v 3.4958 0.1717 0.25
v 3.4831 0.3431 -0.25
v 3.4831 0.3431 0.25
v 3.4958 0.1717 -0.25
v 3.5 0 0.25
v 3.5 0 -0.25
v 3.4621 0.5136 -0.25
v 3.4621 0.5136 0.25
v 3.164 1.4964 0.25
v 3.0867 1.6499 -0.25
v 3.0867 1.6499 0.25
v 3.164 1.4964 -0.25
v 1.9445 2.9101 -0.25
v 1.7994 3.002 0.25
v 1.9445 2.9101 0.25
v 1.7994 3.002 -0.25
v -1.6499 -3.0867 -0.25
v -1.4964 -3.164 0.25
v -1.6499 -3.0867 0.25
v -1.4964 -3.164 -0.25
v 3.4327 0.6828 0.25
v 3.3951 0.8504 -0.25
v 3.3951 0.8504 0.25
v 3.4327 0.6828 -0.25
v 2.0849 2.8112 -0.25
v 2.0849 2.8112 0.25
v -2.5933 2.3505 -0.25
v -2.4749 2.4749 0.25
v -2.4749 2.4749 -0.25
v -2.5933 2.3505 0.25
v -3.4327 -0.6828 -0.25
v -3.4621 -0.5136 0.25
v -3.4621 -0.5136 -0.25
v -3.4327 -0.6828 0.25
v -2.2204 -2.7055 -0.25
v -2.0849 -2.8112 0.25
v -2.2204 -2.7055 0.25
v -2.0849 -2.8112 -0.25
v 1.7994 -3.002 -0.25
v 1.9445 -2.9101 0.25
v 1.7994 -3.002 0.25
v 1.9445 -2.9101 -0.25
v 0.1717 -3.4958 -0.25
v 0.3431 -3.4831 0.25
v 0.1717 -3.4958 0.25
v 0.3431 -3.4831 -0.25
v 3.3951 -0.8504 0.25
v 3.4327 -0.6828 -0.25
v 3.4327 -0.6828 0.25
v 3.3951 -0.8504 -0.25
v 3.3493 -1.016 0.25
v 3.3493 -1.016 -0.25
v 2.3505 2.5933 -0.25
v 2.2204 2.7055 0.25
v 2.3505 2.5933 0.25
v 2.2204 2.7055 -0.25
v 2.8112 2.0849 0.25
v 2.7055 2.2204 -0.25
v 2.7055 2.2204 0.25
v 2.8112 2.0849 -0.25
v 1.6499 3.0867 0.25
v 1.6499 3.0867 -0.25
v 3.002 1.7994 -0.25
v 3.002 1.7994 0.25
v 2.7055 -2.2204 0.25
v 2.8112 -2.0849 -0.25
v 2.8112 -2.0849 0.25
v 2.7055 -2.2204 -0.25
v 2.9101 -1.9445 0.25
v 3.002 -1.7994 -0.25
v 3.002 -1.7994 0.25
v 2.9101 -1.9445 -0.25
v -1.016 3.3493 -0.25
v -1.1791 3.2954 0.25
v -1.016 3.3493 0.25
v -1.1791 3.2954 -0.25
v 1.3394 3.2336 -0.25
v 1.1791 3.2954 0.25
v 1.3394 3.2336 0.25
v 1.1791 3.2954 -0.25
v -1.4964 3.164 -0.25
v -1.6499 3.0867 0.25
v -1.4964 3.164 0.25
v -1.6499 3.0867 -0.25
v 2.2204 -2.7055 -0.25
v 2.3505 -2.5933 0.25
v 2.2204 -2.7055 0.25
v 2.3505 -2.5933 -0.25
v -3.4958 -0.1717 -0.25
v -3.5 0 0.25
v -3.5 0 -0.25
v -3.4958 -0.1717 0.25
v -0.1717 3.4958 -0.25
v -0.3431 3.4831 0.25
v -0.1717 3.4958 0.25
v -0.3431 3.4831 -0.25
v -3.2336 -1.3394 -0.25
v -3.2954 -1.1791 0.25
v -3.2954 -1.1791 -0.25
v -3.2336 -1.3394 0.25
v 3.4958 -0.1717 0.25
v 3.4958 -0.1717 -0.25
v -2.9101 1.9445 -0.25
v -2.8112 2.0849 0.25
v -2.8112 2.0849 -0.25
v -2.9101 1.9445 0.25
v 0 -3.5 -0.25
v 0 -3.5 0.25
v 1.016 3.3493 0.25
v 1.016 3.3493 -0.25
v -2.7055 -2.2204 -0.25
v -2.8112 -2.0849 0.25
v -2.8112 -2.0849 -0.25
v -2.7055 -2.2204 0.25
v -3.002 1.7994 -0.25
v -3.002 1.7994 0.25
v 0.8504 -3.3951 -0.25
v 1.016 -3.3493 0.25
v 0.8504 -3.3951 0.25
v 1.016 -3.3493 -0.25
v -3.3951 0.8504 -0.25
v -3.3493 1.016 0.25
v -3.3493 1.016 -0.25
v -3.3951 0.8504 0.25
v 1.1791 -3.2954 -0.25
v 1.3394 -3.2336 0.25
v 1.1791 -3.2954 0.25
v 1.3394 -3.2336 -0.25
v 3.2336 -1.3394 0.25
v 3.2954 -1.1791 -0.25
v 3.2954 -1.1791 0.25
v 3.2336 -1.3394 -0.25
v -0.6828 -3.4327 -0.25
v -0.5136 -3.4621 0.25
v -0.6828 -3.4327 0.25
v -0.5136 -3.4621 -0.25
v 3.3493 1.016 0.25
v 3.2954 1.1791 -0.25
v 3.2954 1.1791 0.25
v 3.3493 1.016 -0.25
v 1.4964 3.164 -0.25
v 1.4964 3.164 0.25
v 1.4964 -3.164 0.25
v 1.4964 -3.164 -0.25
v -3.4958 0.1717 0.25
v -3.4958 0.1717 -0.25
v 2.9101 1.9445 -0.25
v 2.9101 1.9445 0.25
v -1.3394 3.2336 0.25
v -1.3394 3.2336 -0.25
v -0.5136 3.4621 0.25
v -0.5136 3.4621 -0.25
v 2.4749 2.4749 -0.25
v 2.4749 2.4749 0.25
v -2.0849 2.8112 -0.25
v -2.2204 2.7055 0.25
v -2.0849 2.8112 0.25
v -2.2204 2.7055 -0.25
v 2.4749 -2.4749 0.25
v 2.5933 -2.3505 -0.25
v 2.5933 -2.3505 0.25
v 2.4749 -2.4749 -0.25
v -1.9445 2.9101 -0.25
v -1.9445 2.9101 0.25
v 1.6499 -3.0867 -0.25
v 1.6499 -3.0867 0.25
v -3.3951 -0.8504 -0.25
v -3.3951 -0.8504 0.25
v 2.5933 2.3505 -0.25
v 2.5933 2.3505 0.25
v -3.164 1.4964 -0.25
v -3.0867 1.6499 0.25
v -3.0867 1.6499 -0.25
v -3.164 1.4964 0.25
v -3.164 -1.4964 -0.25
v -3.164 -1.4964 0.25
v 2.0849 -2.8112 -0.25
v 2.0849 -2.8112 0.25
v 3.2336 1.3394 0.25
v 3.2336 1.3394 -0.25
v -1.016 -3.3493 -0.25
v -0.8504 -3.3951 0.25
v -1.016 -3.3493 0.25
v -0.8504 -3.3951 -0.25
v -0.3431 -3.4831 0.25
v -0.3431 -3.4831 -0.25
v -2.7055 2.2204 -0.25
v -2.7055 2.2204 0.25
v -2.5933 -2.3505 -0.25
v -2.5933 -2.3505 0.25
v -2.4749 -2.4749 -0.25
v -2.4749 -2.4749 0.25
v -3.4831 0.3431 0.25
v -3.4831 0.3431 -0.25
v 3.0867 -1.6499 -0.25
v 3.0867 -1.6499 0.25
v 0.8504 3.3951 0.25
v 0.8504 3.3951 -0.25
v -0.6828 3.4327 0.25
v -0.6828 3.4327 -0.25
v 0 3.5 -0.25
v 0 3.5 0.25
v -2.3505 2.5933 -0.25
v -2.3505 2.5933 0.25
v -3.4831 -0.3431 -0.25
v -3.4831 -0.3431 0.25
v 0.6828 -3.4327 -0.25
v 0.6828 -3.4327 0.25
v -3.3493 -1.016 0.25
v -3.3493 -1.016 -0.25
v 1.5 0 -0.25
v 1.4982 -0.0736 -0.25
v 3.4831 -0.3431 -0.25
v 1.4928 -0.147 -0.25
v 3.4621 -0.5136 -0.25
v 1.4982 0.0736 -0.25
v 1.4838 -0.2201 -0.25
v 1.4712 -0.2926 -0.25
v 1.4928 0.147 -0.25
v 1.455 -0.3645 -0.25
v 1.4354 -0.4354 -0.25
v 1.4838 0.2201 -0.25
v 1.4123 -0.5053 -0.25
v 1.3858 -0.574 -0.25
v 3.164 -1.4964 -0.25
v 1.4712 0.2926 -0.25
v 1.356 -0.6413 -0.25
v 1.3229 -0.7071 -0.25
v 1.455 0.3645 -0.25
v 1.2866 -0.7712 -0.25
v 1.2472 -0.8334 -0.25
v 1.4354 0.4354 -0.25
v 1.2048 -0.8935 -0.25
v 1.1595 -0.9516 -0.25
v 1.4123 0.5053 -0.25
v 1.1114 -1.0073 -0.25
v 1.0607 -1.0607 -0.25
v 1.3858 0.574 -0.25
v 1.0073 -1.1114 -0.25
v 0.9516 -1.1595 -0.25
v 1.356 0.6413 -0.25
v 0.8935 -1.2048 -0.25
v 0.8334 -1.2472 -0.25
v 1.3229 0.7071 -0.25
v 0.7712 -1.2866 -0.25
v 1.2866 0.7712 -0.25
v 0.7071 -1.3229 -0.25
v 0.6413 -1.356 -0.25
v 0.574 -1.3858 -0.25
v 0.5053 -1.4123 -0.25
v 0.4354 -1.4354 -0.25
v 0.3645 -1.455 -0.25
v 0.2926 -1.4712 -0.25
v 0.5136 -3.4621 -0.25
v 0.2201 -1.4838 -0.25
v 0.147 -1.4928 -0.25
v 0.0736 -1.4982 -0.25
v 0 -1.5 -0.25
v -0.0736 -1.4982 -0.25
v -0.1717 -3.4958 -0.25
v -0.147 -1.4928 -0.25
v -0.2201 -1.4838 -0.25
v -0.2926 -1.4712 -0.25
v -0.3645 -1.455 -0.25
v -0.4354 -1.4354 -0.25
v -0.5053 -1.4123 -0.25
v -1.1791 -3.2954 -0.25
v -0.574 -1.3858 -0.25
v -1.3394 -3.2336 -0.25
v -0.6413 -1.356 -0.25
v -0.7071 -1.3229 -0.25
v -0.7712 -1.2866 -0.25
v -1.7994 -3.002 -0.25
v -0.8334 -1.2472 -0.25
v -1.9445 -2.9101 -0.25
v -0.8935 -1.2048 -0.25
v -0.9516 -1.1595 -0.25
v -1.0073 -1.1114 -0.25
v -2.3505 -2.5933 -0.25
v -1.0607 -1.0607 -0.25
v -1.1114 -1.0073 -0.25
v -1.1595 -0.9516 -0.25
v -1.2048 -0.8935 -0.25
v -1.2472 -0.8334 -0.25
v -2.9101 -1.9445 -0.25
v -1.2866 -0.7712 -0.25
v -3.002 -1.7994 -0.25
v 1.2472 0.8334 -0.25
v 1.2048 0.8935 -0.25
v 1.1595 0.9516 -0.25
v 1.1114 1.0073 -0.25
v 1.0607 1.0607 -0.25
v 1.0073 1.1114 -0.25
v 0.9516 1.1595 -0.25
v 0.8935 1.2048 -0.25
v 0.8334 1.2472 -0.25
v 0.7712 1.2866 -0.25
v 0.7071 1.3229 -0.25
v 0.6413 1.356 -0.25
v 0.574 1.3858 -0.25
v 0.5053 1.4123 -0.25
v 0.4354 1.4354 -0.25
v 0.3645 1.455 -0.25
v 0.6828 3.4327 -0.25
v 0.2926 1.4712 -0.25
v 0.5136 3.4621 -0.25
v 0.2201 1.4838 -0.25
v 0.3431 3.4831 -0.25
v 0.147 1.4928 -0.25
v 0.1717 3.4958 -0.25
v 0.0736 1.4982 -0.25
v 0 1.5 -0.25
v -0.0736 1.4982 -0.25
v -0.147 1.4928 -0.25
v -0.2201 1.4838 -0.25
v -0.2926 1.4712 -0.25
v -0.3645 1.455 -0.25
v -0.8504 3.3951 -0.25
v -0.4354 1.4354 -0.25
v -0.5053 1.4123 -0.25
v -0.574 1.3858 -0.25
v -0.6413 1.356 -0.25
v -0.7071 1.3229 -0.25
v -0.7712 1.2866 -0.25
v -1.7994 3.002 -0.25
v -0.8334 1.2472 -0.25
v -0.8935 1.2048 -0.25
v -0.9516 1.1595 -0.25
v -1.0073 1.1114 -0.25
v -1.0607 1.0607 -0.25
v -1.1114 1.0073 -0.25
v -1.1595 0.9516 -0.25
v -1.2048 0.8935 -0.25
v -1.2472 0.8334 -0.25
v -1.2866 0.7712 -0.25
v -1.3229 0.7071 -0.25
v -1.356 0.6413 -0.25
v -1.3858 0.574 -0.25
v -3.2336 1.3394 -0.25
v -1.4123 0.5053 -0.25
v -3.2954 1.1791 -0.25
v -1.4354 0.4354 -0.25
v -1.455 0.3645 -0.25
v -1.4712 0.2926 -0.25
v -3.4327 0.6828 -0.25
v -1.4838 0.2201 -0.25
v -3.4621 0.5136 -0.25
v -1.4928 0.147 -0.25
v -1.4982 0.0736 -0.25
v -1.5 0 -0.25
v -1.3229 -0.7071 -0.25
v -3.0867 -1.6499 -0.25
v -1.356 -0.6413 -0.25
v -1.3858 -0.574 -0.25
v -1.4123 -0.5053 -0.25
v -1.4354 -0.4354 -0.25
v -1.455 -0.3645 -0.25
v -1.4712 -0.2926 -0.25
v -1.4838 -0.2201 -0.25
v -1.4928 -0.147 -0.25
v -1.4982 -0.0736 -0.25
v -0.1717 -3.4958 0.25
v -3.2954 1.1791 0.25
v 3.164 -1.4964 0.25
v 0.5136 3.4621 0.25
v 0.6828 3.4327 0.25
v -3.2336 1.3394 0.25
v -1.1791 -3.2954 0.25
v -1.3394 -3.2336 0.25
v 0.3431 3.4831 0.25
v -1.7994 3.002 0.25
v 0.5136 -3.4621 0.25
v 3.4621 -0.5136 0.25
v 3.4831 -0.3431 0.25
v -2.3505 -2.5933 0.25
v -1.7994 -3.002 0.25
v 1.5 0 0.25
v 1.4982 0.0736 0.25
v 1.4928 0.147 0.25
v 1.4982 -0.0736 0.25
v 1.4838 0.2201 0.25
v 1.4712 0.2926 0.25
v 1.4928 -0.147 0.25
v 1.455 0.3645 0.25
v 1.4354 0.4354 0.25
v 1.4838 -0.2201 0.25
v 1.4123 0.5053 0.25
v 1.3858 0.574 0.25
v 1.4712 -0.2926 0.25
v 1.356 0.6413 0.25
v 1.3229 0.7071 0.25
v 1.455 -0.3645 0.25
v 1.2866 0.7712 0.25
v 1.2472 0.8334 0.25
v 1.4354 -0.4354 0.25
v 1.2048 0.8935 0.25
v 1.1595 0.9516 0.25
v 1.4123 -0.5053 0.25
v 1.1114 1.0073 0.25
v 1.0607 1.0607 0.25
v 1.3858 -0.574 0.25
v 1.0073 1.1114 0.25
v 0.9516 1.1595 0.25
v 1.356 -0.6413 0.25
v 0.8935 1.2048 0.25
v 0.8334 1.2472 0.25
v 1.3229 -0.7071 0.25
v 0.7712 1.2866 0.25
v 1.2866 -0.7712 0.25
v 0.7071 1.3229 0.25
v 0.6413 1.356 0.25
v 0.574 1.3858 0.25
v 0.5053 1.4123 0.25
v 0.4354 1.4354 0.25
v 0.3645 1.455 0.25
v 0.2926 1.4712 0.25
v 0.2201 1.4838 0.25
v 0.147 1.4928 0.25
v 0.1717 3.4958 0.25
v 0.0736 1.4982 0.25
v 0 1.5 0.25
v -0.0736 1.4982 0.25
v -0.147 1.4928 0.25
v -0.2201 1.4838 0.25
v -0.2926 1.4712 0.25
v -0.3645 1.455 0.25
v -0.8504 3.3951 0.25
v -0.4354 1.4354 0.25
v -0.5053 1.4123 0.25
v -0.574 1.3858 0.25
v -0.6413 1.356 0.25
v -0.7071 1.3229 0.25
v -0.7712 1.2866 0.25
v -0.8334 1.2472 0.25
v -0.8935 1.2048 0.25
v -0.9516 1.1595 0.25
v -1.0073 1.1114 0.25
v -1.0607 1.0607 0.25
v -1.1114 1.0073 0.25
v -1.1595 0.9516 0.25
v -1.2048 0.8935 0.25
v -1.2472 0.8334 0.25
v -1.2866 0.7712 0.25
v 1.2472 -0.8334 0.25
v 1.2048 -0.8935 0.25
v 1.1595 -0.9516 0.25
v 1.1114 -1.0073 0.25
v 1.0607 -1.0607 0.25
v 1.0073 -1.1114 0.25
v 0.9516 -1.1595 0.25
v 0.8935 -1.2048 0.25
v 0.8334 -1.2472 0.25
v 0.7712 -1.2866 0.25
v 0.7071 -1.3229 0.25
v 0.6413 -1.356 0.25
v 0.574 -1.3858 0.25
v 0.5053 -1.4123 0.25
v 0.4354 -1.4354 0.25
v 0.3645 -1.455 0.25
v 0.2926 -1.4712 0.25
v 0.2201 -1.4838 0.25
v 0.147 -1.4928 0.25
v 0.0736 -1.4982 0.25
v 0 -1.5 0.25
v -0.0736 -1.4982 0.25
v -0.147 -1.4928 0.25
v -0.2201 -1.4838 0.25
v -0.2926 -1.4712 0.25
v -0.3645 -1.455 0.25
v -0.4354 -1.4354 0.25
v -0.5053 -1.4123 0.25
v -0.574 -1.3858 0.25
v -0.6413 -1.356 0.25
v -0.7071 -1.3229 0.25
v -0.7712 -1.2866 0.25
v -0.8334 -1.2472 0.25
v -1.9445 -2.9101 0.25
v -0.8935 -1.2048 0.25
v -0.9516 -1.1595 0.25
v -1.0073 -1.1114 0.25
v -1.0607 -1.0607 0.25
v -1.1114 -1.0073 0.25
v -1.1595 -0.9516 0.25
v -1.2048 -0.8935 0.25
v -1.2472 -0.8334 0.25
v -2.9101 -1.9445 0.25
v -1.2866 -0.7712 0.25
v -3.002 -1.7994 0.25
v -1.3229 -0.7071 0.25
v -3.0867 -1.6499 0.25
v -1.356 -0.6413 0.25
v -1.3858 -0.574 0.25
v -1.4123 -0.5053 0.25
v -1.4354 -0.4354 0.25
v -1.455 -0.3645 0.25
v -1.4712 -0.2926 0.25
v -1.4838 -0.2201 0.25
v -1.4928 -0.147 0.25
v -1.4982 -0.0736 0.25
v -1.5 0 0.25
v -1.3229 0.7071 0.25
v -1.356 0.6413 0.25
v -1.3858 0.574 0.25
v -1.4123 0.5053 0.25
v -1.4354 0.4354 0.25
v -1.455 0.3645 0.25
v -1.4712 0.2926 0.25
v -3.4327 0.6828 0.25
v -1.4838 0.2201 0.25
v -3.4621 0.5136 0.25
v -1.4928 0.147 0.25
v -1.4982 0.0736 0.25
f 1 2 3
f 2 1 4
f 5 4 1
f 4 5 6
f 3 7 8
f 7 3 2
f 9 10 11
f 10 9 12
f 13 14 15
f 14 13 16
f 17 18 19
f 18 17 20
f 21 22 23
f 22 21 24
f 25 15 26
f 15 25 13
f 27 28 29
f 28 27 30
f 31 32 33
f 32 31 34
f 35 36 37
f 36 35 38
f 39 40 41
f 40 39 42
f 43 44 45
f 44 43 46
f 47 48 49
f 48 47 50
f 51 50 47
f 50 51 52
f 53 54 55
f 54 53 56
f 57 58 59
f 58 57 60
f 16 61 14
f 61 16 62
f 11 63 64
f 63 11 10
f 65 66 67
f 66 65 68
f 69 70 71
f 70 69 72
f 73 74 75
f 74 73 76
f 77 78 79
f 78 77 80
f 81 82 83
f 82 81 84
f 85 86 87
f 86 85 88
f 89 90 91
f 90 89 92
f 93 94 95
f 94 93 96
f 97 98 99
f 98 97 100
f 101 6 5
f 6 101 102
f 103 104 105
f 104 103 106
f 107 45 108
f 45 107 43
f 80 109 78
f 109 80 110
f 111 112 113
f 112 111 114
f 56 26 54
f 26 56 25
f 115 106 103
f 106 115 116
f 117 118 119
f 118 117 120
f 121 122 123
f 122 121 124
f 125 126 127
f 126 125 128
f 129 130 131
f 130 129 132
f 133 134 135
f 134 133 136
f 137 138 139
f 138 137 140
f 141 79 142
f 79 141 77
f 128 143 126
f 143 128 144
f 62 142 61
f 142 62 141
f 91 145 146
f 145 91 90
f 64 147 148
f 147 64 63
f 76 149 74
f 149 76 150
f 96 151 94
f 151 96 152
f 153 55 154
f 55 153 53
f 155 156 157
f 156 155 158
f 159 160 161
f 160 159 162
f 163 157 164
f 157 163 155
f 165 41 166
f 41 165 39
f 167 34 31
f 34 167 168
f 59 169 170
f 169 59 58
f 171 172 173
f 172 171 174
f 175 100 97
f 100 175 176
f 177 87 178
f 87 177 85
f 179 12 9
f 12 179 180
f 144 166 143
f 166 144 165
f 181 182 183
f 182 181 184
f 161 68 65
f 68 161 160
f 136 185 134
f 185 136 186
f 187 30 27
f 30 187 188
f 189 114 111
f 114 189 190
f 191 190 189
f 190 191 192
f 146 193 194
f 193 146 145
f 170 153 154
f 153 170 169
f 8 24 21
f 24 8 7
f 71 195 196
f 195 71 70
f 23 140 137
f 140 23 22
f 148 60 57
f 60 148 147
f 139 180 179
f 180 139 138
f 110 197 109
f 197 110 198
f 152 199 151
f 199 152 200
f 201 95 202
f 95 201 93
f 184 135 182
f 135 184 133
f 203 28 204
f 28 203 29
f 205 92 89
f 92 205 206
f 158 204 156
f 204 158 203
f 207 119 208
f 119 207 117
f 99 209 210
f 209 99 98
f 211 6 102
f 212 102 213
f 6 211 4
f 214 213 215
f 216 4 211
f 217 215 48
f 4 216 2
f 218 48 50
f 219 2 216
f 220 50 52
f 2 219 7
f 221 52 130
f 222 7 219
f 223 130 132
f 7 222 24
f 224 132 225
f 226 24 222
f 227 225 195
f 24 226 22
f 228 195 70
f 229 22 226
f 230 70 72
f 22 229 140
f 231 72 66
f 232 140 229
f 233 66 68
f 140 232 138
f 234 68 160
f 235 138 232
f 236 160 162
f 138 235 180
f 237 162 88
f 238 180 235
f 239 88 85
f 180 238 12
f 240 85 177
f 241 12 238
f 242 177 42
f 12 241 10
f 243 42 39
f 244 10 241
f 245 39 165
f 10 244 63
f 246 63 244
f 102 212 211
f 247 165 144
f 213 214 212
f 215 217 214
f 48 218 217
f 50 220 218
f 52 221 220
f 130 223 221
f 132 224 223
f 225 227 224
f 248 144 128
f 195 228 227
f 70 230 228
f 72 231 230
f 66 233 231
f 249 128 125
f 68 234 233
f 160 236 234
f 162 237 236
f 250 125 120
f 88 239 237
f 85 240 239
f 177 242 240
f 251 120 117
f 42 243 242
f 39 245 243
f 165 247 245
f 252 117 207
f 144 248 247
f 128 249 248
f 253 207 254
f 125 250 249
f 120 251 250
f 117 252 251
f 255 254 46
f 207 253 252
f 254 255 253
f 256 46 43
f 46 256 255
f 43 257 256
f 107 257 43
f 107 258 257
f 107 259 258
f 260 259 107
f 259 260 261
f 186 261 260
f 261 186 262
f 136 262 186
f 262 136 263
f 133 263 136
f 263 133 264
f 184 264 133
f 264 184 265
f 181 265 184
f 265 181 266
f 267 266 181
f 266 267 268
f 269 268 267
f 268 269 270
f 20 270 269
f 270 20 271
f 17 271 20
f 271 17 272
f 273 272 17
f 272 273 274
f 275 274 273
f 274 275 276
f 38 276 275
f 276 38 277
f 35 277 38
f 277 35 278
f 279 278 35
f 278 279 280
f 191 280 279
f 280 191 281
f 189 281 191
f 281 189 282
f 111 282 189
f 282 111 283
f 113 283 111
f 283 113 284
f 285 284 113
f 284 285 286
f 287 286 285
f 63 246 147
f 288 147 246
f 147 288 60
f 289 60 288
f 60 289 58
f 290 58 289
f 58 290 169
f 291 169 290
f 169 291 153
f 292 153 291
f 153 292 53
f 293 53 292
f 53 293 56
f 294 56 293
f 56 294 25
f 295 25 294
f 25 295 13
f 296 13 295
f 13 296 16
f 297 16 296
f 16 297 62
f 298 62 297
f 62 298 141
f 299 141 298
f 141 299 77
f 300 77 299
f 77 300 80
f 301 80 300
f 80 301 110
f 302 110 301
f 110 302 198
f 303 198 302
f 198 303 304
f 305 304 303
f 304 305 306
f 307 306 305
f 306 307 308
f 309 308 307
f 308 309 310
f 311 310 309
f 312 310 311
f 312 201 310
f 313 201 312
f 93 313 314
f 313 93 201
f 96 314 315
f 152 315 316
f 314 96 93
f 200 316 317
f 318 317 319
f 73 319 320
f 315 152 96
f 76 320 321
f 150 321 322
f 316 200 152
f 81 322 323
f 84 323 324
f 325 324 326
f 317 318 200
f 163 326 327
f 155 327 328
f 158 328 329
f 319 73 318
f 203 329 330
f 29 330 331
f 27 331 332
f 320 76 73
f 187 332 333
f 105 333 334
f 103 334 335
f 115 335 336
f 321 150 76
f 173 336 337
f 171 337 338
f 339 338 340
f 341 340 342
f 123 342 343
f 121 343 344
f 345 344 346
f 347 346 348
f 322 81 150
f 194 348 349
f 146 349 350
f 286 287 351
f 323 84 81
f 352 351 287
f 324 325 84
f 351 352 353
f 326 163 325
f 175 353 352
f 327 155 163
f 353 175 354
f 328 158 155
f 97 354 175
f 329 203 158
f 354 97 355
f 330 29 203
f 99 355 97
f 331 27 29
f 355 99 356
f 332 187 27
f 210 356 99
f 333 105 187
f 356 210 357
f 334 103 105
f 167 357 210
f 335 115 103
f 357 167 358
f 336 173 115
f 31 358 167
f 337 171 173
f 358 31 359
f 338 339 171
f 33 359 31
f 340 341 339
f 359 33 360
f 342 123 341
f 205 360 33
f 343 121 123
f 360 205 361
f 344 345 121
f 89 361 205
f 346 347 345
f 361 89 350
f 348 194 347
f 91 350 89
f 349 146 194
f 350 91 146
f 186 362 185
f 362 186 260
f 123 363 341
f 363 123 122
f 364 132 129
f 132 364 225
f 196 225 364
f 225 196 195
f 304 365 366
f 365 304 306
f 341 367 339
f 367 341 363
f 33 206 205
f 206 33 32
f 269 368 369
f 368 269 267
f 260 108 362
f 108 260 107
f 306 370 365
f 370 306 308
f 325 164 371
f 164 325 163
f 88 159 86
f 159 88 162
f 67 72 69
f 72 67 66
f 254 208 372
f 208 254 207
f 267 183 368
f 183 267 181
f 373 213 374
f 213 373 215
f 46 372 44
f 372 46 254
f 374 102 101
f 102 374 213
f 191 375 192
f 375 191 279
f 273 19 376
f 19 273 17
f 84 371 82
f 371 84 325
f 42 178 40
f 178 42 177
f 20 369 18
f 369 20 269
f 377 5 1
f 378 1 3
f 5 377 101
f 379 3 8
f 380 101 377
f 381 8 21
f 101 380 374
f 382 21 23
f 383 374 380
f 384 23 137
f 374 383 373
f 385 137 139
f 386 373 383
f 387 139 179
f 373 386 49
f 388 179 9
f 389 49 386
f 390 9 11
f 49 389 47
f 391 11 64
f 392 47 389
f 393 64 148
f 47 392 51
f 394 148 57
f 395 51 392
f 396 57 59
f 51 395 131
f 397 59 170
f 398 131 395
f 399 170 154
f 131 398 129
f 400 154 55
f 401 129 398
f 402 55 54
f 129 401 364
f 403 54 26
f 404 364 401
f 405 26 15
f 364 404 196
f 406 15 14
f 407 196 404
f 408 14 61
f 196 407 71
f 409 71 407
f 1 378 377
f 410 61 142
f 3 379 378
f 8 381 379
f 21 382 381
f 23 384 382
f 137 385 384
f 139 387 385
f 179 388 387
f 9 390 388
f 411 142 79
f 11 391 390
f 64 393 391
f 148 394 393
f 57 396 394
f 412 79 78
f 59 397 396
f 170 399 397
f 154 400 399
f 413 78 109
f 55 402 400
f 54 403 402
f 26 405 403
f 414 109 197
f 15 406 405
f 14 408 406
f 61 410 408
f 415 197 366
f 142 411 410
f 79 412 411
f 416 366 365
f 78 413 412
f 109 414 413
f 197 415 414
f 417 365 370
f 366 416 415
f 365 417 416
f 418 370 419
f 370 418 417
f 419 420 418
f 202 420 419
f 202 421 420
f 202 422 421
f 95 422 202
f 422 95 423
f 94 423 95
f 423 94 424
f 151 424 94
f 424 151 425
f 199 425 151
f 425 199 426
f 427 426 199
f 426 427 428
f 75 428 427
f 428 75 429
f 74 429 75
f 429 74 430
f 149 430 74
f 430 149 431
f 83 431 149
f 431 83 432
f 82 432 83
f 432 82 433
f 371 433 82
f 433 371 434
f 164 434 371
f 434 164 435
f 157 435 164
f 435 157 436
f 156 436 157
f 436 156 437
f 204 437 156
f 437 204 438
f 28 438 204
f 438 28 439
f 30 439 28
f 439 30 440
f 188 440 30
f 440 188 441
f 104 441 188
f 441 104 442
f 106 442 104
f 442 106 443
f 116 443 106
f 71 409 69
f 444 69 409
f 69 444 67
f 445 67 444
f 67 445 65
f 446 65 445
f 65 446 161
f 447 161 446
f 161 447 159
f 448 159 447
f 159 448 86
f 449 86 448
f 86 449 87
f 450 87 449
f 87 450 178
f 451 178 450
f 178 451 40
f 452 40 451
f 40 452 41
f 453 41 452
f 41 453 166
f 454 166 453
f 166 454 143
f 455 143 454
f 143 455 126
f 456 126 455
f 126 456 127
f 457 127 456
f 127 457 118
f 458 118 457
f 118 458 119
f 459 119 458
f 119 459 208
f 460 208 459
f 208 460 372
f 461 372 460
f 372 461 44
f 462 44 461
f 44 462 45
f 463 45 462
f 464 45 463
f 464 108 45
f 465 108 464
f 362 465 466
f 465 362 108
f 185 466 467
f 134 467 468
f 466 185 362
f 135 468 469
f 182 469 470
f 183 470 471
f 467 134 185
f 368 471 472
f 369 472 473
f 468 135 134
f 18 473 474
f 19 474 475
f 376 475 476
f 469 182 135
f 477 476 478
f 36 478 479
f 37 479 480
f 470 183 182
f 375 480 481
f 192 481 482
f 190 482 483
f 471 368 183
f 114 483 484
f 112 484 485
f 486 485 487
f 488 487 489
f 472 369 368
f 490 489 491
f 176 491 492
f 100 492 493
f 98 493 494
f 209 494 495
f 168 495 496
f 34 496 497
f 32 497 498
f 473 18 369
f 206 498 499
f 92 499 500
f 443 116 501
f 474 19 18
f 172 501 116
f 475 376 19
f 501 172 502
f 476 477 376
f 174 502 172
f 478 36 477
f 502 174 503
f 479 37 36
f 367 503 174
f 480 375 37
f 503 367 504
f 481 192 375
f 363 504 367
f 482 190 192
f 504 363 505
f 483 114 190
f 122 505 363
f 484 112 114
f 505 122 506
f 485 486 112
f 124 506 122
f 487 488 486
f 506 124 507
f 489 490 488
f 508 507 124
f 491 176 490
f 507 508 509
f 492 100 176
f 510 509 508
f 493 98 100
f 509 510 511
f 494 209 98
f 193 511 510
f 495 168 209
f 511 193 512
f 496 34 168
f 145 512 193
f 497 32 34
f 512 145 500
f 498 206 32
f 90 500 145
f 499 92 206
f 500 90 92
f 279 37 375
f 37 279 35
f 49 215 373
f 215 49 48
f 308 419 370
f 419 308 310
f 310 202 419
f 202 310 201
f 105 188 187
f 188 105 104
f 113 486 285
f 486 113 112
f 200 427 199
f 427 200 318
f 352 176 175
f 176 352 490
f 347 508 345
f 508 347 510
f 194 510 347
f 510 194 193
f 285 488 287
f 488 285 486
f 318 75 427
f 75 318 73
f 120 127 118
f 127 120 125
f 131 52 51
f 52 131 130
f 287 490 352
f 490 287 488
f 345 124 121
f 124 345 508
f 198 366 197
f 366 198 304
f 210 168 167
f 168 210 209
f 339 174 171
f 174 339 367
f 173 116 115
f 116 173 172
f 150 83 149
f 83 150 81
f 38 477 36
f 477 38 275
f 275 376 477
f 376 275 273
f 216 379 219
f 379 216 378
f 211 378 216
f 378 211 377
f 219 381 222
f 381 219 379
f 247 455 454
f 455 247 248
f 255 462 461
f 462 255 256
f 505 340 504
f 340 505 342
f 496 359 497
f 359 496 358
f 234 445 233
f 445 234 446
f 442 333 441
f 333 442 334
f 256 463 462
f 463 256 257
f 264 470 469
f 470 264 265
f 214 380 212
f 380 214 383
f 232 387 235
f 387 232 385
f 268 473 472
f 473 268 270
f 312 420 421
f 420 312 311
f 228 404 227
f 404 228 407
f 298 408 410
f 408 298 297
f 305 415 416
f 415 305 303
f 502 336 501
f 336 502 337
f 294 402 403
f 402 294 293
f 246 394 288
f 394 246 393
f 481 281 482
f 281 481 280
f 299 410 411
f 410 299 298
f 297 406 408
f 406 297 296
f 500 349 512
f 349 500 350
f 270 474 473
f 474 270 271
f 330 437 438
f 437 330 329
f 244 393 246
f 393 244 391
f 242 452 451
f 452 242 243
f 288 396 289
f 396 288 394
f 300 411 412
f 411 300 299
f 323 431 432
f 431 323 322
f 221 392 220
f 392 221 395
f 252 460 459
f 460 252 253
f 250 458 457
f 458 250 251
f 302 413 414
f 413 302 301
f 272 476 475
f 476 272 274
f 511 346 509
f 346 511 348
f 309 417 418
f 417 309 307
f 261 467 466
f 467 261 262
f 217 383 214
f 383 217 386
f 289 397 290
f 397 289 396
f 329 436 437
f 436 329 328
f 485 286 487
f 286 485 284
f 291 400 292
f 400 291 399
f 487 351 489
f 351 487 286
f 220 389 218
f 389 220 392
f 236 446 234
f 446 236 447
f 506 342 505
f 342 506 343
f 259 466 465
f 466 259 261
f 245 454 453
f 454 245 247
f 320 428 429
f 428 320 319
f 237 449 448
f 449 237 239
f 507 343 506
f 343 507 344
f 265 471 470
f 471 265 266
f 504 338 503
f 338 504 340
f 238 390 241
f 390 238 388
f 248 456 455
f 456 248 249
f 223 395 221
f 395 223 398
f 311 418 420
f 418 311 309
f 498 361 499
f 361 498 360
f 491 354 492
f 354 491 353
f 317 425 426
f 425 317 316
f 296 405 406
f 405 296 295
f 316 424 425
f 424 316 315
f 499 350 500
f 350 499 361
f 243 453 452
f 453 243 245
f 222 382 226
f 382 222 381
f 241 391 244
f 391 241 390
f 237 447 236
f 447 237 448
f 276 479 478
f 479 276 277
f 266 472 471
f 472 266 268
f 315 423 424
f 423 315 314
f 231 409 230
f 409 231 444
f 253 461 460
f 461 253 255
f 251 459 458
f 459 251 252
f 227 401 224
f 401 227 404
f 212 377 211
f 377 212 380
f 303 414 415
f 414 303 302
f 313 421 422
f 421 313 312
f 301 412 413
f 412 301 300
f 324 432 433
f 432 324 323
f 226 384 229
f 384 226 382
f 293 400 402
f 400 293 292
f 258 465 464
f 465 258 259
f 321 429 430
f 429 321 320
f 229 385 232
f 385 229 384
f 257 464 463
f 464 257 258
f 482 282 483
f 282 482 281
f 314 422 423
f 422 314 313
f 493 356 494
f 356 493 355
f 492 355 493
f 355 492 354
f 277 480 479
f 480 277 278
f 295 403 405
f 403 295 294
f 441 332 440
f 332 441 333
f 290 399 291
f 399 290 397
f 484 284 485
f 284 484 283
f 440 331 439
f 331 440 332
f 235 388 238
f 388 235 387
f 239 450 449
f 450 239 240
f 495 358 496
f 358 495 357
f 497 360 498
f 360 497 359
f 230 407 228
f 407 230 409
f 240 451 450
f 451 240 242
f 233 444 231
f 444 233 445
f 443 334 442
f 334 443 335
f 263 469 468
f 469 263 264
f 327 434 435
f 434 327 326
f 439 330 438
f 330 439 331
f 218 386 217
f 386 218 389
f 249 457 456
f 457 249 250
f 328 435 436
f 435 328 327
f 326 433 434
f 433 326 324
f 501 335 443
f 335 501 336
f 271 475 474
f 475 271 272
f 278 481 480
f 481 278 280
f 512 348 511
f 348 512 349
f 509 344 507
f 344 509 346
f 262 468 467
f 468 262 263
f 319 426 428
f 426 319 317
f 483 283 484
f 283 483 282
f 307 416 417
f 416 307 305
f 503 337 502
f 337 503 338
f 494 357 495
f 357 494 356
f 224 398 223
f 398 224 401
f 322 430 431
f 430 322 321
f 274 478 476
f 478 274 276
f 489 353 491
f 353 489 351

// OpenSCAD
$fn=128;

module washer(id=3.0, od=7.0, t=0.5){
    difference(){
        cylinder(h=t, d=od, center=true);
        cylinder(h=t+0.2, d=id, center=true);
    }
}

washer();
